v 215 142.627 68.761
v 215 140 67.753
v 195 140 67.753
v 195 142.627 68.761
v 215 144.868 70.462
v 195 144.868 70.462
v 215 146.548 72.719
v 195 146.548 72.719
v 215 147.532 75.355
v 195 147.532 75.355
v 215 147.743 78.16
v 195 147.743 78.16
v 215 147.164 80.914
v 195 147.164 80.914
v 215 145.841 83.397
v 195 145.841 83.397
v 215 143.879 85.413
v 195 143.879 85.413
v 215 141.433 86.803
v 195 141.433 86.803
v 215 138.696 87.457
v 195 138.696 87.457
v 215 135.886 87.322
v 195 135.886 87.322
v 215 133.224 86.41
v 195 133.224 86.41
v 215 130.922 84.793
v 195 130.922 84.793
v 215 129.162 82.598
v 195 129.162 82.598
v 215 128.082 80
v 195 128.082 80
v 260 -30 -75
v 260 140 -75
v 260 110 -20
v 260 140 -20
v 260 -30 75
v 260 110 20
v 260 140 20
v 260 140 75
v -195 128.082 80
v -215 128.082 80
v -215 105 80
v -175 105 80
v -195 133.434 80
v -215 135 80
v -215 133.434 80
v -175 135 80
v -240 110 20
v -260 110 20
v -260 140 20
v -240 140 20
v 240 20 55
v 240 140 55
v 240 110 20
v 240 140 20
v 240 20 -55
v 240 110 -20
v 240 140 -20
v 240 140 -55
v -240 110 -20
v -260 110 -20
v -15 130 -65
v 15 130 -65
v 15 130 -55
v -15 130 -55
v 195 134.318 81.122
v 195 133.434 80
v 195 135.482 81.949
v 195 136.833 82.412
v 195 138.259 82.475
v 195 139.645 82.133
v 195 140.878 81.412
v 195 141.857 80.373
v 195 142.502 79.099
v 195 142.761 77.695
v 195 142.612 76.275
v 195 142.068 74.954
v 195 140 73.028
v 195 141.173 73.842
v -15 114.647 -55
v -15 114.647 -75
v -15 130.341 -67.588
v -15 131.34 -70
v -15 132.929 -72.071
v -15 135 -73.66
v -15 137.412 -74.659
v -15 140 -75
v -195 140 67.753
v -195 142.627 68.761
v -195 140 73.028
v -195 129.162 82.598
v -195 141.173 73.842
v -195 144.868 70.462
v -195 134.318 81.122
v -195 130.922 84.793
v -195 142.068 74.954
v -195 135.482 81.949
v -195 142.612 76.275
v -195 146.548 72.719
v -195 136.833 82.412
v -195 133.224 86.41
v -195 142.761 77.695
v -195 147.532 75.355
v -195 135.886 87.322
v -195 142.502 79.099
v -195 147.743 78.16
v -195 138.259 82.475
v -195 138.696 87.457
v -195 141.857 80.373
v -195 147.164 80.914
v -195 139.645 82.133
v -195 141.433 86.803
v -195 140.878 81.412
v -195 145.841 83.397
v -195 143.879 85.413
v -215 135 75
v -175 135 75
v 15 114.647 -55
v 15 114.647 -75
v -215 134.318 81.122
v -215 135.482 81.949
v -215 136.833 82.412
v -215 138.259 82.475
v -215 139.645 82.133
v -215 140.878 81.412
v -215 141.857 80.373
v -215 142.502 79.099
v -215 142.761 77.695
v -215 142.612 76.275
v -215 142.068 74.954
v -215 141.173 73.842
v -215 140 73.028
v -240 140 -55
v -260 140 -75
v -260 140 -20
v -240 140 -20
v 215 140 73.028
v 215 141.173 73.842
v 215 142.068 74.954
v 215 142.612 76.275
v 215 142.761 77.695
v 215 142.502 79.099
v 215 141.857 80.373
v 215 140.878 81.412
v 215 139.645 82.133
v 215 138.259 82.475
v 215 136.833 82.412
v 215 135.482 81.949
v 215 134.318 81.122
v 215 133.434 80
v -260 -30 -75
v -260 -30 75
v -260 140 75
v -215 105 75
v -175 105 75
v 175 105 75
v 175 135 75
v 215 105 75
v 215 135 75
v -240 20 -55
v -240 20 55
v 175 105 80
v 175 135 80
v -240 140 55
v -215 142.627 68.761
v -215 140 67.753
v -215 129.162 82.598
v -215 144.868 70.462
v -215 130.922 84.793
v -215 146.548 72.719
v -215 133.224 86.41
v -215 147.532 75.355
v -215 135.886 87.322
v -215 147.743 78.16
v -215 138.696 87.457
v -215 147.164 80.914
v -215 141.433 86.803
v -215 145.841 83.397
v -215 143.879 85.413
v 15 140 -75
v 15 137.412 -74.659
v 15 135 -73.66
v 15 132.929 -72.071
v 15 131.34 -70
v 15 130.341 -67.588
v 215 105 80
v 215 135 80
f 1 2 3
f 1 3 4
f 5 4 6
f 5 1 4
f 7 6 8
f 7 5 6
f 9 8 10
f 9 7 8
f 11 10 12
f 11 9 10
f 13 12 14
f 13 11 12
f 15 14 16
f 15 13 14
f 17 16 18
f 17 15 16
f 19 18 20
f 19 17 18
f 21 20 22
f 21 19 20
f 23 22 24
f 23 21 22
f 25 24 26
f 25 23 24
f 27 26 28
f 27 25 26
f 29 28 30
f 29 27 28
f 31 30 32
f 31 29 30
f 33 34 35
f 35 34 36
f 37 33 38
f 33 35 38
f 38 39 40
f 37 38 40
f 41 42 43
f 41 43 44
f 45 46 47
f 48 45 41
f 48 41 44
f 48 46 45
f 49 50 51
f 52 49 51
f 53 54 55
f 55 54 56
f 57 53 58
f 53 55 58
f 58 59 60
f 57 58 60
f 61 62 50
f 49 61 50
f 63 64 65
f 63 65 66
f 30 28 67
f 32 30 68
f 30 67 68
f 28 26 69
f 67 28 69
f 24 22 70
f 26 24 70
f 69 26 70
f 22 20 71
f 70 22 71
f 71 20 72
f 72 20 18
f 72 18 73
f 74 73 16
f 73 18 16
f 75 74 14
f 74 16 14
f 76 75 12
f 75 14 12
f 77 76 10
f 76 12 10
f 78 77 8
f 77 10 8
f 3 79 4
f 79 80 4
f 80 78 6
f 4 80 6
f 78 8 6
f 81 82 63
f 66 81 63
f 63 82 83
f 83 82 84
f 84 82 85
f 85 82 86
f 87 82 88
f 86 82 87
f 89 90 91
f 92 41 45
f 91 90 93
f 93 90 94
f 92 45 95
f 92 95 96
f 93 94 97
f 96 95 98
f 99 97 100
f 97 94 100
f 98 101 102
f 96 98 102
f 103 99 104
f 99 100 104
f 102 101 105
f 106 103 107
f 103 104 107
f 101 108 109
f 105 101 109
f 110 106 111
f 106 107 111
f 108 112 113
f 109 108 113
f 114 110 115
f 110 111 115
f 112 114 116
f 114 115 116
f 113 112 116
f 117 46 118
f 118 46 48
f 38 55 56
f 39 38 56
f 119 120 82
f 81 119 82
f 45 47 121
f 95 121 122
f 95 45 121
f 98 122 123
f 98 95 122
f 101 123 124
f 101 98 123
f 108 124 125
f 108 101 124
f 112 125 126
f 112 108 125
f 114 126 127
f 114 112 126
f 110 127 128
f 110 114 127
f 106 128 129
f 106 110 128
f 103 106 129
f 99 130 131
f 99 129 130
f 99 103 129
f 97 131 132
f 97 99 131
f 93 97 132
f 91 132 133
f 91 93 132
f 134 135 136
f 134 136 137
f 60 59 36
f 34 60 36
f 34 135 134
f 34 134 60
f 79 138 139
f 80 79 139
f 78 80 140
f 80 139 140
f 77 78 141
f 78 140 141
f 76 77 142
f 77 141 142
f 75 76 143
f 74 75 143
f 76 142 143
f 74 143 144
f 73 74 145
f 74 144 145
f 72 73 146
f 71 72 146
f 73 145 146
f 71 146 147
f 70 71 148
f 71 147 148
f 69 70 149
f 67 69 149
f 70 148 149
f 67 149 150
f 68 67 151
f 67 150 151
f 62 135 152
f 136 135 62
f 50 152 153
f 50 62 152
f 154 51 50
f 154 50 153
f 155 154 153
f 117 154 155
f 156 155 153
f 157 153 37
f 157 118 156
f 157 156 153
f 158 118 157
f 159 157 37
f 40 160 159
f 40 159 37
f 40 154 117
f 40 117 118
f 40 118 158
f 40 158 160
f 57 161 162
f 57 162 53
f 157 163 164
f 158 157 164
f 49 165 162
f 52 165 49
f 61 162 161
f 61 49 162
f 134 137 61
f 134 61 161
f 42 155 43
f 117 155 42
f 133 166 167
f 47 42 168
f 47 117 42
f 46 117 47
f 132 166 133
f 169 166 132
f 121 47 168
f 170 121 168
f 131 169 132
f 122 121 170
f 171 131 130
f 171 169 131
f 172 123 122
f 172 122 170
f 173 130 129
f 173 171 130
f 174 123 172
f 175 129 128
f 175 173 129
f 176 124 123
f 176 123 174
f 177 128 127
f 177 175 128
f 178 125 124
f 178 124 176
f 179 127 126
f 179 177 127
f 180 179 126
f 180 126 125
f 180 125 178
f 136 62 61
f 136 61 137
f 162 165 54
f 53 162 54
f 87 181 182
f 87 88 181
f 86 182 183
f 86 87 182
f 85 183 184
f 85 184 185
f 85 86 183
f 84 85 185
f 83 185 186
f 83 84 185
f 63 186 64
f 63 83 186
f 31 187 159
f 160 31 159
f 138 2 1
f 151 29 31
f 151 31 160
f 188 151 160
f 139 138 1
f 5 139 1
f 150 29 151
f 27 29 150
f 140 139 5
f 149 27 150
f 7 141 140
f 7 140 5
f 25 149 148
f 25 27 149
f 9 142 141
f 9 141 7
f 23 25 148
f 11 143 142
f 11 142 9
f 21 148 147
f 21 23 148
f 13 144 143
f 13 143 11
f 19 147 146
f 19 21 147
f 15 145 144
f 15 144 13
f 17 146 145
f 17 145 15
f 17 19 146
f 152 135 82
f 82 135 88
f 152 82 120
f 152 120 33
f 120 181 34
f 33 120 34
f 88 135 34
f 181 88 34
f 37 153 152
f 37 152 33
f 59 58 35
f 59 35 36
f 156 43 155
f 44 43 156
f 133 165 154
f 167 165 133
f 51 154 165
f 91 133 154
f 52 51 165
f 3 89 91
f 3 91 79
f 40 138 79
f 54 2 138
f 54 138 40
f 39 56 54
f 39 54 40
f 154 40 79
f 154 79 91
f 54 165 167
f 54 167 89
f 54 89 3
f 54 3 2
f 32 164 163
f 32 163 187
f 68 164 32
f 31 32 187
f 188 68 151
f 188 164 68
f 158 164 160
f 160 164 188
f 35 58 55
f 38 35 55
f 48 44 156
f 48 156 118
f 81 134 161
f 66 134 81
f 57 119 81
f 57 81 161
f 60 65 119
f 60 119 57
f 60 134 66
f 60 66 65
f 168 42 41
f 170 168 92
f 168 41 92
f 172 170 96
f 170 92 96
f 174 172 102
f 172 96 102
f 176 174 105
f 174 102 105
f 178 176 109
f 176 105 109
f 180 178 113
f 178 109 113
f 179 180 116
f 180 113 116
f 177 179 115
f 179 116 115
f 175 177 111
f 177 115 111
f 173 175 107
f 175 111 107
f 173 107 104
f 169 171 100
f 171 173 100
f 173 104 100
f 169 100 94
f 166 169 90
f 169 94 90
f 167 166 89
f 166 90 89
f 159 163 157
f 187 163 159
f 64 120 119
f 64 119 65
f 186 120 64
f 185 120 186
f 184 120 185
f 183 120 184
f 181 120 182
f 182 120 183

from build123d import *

# Parameters (mm, degrees)
SKETCH_1_W          = 520
SKETCH_1_H          = 150
EXTRUDE_1_DEPTH     = 140
SKETCH_2_W          = 480
SKETCH_2_H          = 110
CUT_EXTRUDE_1_DEPTH = 120
SKETCH_4_W          = 40
SKETCH_4_H          = 30
EXTRUDE_2_DEPTH     = 30
SKETCH_5_W          = 40
SKETCH_5_H          = 30
EXTRUDE_3_DEPTH     = 30
SKETCH_7_R          = 10
SKETCH_7_R_2        = 5
EXTRUDE_1_2_DEPTH   = 20
EXTRUDE_START       = -20
SKETCH_9_R          = 10
SKETCH_9_R_2        = 5
EXTRUDE_2_2_DEPTH   = 20
SKETCH_11_W         = 40
SKETCH_11_H         = 30
CUT_EXTRUDE_3_DEPTH = 548.622704745
SKETCH_13_W         = 520
SKETCH_13_H         = 150
EXTRUDE_6_DEPTH     = 30
SKETCH_14_W         = 40
SKETCH_14_H         = 5
CUT_EXTRUDE_6_DEPTH = 30
SKETCH_15_W         = 40
SKETCH_15_H         = 5
CUT_EXTRUDE_7_DEPTH = 30
SKETCH_18_W         = 30
SKETCH_18_H         = 15.352958973
CUT_EXTRUDE_8_DEPTH = 30
FILLET_1_R          = 10


with BuildPart() as part:
    # 草圖1 → Extrude 1 (new body)
    with BuildSketch(Plane(origin=(0, 0, 0), x_dir=(1, 0, 0), z_dir=(0, 1, 0))):
        Rectangle(SKETCH_1_W, SKETCH_1_H)
    extrude(amount=EXTRUDE_1_DEPTH)

    # 草圖2 → 除料-伸長1 (cut)
    with BuildSketch(Plane(origin=(0, 140, 0), x_dir=(1, 0, 0), z_dir=(0, 1, 0))):
        Rectangle(SKETCH_2_W, SKETCH_2_H)
    extrude(amount=-CUT_EXTRUDE_1_DEPTH, mode=Mode.SUBTRACT)

    # 草圖4 → Extrude 2 (add)
    with BuildSketch(Plane.XY.offset(80)):
        with Locations((-195, 120)):
            Rectangle(SKETCH_4_W, SKETCH_4_H)
    extrude(amount=-EXTRUDE_2_DEPTH)

    # 草圖5 → 填料-伸長3 (add)
    with BuildSketch(Plane.XY.offset(80)):
        with Locations((195, 120)):
            Rectangle(SKETCH_5_W, SKETCH_5_H)
    extrude(amount=-EXTRUDE_3_DEPTH)

    # 草圖7 → Extrude 1 2 (add)
    with BuildSketch(Plane(origin=(215, 0, 0), x_dir=(0, 0, -1), z_dir=(1, 0, 0))):
        with Locations((-77.5, 137.764599119)):
            Circle(SKETCH_7_R)
        with Locations((-77.5, 137.764599119)):
            Circle(SKETCH_7_R_2, mode=Mode.SUBTRACT)
    extrude(amount=-EXTRUDE_1_2_DEPTH)

    # 草圖9 → Extrude 2 2 (add)
    with BuildSketch(Plane.ZY.offset(215).offset(EXTRUDE_START)):
        with Locations((77.5, 137.764599119)):
            Circle(SKETCH_9_R)
        with Locations((77.5, 137.764599119)):
            Circle(SKETCH_9_R_2, mode=Mode.SUBTRACT)
    extrude(amount=EXTRUDE_2_2_DEPTH)

    # 草圖11 → 除料-伸長3 (cut, through all)
    with BuildSketch(Plane.ZY.offset(260)):
        with Locations((0, 125)):
            Rectangle(SKETCH_11_W, SKETCH_11_H)
    extrude(amount=-CUT_EXTRUDE_3_DEPTH, mode=Mode.SUBTRACT)

    # 草圖13 → 填料-伸長6 (add)
    with BuildSketch(Plane.XZ):
        Rectangle(SKETCH_13_W, SKETCH_13_H)
    extrude(amount=EXTRUDE_6_DEPTH)

    # 草圖14 → 除料-伸長6 (cut)
    with BuildSketch(Plane(origin=(0, 135, 0), x_dir=(1, 0, 0), z_dir=(0, 1, 0))):
        with Locations((195, -52.5)):
            Rectangle(SKETCH_14_W, SKETCH_14_H)
    extrude(amount=-CUT_EXTRUDE_6_DEPTH, mode=Mode.SUBTRACT)

    # 草圖15 → 除料-伸長7 (cut)
    with BuildSketch(Plane(origin=(0, 135, 0), x_dir=(1, 0, 0), z_dir=(0, 1, 0))):
        with Locations((-195, -52.5)):
            Rectangle(SKETCH_15_W, SKETCH_15_H)
    extrude(amount=-CUT_EXTRUDE_7_DEPTH, mode=Mode.SUBTRACT)

    # 草圖18 → 除料-伸長8 (cut)
    with BuildSketch(Plane(origin=(0, 0, -75), x_dir=(-1, 0, 0), z_dir=(0, 0, -1))):
        with Locations((0, 122.323520514)):
            Rectangle(SKETCH_18_W, SKETCH_18_H)
    extrude(amount=-CUT_EXTRUDE_8_DEPTH, mode=Mode.SUBTRACT)

    # 圓角1
    fillet_1_edges = [part.edges().sort_by_distance(p)[0] for p in [
        (0, 130, -75),
    ]]
    fillet(fillet_1_edges, radius=FILLET_1_R - 0.0001)  # a hair under: the kernel refuses the full size


solid = part.part
